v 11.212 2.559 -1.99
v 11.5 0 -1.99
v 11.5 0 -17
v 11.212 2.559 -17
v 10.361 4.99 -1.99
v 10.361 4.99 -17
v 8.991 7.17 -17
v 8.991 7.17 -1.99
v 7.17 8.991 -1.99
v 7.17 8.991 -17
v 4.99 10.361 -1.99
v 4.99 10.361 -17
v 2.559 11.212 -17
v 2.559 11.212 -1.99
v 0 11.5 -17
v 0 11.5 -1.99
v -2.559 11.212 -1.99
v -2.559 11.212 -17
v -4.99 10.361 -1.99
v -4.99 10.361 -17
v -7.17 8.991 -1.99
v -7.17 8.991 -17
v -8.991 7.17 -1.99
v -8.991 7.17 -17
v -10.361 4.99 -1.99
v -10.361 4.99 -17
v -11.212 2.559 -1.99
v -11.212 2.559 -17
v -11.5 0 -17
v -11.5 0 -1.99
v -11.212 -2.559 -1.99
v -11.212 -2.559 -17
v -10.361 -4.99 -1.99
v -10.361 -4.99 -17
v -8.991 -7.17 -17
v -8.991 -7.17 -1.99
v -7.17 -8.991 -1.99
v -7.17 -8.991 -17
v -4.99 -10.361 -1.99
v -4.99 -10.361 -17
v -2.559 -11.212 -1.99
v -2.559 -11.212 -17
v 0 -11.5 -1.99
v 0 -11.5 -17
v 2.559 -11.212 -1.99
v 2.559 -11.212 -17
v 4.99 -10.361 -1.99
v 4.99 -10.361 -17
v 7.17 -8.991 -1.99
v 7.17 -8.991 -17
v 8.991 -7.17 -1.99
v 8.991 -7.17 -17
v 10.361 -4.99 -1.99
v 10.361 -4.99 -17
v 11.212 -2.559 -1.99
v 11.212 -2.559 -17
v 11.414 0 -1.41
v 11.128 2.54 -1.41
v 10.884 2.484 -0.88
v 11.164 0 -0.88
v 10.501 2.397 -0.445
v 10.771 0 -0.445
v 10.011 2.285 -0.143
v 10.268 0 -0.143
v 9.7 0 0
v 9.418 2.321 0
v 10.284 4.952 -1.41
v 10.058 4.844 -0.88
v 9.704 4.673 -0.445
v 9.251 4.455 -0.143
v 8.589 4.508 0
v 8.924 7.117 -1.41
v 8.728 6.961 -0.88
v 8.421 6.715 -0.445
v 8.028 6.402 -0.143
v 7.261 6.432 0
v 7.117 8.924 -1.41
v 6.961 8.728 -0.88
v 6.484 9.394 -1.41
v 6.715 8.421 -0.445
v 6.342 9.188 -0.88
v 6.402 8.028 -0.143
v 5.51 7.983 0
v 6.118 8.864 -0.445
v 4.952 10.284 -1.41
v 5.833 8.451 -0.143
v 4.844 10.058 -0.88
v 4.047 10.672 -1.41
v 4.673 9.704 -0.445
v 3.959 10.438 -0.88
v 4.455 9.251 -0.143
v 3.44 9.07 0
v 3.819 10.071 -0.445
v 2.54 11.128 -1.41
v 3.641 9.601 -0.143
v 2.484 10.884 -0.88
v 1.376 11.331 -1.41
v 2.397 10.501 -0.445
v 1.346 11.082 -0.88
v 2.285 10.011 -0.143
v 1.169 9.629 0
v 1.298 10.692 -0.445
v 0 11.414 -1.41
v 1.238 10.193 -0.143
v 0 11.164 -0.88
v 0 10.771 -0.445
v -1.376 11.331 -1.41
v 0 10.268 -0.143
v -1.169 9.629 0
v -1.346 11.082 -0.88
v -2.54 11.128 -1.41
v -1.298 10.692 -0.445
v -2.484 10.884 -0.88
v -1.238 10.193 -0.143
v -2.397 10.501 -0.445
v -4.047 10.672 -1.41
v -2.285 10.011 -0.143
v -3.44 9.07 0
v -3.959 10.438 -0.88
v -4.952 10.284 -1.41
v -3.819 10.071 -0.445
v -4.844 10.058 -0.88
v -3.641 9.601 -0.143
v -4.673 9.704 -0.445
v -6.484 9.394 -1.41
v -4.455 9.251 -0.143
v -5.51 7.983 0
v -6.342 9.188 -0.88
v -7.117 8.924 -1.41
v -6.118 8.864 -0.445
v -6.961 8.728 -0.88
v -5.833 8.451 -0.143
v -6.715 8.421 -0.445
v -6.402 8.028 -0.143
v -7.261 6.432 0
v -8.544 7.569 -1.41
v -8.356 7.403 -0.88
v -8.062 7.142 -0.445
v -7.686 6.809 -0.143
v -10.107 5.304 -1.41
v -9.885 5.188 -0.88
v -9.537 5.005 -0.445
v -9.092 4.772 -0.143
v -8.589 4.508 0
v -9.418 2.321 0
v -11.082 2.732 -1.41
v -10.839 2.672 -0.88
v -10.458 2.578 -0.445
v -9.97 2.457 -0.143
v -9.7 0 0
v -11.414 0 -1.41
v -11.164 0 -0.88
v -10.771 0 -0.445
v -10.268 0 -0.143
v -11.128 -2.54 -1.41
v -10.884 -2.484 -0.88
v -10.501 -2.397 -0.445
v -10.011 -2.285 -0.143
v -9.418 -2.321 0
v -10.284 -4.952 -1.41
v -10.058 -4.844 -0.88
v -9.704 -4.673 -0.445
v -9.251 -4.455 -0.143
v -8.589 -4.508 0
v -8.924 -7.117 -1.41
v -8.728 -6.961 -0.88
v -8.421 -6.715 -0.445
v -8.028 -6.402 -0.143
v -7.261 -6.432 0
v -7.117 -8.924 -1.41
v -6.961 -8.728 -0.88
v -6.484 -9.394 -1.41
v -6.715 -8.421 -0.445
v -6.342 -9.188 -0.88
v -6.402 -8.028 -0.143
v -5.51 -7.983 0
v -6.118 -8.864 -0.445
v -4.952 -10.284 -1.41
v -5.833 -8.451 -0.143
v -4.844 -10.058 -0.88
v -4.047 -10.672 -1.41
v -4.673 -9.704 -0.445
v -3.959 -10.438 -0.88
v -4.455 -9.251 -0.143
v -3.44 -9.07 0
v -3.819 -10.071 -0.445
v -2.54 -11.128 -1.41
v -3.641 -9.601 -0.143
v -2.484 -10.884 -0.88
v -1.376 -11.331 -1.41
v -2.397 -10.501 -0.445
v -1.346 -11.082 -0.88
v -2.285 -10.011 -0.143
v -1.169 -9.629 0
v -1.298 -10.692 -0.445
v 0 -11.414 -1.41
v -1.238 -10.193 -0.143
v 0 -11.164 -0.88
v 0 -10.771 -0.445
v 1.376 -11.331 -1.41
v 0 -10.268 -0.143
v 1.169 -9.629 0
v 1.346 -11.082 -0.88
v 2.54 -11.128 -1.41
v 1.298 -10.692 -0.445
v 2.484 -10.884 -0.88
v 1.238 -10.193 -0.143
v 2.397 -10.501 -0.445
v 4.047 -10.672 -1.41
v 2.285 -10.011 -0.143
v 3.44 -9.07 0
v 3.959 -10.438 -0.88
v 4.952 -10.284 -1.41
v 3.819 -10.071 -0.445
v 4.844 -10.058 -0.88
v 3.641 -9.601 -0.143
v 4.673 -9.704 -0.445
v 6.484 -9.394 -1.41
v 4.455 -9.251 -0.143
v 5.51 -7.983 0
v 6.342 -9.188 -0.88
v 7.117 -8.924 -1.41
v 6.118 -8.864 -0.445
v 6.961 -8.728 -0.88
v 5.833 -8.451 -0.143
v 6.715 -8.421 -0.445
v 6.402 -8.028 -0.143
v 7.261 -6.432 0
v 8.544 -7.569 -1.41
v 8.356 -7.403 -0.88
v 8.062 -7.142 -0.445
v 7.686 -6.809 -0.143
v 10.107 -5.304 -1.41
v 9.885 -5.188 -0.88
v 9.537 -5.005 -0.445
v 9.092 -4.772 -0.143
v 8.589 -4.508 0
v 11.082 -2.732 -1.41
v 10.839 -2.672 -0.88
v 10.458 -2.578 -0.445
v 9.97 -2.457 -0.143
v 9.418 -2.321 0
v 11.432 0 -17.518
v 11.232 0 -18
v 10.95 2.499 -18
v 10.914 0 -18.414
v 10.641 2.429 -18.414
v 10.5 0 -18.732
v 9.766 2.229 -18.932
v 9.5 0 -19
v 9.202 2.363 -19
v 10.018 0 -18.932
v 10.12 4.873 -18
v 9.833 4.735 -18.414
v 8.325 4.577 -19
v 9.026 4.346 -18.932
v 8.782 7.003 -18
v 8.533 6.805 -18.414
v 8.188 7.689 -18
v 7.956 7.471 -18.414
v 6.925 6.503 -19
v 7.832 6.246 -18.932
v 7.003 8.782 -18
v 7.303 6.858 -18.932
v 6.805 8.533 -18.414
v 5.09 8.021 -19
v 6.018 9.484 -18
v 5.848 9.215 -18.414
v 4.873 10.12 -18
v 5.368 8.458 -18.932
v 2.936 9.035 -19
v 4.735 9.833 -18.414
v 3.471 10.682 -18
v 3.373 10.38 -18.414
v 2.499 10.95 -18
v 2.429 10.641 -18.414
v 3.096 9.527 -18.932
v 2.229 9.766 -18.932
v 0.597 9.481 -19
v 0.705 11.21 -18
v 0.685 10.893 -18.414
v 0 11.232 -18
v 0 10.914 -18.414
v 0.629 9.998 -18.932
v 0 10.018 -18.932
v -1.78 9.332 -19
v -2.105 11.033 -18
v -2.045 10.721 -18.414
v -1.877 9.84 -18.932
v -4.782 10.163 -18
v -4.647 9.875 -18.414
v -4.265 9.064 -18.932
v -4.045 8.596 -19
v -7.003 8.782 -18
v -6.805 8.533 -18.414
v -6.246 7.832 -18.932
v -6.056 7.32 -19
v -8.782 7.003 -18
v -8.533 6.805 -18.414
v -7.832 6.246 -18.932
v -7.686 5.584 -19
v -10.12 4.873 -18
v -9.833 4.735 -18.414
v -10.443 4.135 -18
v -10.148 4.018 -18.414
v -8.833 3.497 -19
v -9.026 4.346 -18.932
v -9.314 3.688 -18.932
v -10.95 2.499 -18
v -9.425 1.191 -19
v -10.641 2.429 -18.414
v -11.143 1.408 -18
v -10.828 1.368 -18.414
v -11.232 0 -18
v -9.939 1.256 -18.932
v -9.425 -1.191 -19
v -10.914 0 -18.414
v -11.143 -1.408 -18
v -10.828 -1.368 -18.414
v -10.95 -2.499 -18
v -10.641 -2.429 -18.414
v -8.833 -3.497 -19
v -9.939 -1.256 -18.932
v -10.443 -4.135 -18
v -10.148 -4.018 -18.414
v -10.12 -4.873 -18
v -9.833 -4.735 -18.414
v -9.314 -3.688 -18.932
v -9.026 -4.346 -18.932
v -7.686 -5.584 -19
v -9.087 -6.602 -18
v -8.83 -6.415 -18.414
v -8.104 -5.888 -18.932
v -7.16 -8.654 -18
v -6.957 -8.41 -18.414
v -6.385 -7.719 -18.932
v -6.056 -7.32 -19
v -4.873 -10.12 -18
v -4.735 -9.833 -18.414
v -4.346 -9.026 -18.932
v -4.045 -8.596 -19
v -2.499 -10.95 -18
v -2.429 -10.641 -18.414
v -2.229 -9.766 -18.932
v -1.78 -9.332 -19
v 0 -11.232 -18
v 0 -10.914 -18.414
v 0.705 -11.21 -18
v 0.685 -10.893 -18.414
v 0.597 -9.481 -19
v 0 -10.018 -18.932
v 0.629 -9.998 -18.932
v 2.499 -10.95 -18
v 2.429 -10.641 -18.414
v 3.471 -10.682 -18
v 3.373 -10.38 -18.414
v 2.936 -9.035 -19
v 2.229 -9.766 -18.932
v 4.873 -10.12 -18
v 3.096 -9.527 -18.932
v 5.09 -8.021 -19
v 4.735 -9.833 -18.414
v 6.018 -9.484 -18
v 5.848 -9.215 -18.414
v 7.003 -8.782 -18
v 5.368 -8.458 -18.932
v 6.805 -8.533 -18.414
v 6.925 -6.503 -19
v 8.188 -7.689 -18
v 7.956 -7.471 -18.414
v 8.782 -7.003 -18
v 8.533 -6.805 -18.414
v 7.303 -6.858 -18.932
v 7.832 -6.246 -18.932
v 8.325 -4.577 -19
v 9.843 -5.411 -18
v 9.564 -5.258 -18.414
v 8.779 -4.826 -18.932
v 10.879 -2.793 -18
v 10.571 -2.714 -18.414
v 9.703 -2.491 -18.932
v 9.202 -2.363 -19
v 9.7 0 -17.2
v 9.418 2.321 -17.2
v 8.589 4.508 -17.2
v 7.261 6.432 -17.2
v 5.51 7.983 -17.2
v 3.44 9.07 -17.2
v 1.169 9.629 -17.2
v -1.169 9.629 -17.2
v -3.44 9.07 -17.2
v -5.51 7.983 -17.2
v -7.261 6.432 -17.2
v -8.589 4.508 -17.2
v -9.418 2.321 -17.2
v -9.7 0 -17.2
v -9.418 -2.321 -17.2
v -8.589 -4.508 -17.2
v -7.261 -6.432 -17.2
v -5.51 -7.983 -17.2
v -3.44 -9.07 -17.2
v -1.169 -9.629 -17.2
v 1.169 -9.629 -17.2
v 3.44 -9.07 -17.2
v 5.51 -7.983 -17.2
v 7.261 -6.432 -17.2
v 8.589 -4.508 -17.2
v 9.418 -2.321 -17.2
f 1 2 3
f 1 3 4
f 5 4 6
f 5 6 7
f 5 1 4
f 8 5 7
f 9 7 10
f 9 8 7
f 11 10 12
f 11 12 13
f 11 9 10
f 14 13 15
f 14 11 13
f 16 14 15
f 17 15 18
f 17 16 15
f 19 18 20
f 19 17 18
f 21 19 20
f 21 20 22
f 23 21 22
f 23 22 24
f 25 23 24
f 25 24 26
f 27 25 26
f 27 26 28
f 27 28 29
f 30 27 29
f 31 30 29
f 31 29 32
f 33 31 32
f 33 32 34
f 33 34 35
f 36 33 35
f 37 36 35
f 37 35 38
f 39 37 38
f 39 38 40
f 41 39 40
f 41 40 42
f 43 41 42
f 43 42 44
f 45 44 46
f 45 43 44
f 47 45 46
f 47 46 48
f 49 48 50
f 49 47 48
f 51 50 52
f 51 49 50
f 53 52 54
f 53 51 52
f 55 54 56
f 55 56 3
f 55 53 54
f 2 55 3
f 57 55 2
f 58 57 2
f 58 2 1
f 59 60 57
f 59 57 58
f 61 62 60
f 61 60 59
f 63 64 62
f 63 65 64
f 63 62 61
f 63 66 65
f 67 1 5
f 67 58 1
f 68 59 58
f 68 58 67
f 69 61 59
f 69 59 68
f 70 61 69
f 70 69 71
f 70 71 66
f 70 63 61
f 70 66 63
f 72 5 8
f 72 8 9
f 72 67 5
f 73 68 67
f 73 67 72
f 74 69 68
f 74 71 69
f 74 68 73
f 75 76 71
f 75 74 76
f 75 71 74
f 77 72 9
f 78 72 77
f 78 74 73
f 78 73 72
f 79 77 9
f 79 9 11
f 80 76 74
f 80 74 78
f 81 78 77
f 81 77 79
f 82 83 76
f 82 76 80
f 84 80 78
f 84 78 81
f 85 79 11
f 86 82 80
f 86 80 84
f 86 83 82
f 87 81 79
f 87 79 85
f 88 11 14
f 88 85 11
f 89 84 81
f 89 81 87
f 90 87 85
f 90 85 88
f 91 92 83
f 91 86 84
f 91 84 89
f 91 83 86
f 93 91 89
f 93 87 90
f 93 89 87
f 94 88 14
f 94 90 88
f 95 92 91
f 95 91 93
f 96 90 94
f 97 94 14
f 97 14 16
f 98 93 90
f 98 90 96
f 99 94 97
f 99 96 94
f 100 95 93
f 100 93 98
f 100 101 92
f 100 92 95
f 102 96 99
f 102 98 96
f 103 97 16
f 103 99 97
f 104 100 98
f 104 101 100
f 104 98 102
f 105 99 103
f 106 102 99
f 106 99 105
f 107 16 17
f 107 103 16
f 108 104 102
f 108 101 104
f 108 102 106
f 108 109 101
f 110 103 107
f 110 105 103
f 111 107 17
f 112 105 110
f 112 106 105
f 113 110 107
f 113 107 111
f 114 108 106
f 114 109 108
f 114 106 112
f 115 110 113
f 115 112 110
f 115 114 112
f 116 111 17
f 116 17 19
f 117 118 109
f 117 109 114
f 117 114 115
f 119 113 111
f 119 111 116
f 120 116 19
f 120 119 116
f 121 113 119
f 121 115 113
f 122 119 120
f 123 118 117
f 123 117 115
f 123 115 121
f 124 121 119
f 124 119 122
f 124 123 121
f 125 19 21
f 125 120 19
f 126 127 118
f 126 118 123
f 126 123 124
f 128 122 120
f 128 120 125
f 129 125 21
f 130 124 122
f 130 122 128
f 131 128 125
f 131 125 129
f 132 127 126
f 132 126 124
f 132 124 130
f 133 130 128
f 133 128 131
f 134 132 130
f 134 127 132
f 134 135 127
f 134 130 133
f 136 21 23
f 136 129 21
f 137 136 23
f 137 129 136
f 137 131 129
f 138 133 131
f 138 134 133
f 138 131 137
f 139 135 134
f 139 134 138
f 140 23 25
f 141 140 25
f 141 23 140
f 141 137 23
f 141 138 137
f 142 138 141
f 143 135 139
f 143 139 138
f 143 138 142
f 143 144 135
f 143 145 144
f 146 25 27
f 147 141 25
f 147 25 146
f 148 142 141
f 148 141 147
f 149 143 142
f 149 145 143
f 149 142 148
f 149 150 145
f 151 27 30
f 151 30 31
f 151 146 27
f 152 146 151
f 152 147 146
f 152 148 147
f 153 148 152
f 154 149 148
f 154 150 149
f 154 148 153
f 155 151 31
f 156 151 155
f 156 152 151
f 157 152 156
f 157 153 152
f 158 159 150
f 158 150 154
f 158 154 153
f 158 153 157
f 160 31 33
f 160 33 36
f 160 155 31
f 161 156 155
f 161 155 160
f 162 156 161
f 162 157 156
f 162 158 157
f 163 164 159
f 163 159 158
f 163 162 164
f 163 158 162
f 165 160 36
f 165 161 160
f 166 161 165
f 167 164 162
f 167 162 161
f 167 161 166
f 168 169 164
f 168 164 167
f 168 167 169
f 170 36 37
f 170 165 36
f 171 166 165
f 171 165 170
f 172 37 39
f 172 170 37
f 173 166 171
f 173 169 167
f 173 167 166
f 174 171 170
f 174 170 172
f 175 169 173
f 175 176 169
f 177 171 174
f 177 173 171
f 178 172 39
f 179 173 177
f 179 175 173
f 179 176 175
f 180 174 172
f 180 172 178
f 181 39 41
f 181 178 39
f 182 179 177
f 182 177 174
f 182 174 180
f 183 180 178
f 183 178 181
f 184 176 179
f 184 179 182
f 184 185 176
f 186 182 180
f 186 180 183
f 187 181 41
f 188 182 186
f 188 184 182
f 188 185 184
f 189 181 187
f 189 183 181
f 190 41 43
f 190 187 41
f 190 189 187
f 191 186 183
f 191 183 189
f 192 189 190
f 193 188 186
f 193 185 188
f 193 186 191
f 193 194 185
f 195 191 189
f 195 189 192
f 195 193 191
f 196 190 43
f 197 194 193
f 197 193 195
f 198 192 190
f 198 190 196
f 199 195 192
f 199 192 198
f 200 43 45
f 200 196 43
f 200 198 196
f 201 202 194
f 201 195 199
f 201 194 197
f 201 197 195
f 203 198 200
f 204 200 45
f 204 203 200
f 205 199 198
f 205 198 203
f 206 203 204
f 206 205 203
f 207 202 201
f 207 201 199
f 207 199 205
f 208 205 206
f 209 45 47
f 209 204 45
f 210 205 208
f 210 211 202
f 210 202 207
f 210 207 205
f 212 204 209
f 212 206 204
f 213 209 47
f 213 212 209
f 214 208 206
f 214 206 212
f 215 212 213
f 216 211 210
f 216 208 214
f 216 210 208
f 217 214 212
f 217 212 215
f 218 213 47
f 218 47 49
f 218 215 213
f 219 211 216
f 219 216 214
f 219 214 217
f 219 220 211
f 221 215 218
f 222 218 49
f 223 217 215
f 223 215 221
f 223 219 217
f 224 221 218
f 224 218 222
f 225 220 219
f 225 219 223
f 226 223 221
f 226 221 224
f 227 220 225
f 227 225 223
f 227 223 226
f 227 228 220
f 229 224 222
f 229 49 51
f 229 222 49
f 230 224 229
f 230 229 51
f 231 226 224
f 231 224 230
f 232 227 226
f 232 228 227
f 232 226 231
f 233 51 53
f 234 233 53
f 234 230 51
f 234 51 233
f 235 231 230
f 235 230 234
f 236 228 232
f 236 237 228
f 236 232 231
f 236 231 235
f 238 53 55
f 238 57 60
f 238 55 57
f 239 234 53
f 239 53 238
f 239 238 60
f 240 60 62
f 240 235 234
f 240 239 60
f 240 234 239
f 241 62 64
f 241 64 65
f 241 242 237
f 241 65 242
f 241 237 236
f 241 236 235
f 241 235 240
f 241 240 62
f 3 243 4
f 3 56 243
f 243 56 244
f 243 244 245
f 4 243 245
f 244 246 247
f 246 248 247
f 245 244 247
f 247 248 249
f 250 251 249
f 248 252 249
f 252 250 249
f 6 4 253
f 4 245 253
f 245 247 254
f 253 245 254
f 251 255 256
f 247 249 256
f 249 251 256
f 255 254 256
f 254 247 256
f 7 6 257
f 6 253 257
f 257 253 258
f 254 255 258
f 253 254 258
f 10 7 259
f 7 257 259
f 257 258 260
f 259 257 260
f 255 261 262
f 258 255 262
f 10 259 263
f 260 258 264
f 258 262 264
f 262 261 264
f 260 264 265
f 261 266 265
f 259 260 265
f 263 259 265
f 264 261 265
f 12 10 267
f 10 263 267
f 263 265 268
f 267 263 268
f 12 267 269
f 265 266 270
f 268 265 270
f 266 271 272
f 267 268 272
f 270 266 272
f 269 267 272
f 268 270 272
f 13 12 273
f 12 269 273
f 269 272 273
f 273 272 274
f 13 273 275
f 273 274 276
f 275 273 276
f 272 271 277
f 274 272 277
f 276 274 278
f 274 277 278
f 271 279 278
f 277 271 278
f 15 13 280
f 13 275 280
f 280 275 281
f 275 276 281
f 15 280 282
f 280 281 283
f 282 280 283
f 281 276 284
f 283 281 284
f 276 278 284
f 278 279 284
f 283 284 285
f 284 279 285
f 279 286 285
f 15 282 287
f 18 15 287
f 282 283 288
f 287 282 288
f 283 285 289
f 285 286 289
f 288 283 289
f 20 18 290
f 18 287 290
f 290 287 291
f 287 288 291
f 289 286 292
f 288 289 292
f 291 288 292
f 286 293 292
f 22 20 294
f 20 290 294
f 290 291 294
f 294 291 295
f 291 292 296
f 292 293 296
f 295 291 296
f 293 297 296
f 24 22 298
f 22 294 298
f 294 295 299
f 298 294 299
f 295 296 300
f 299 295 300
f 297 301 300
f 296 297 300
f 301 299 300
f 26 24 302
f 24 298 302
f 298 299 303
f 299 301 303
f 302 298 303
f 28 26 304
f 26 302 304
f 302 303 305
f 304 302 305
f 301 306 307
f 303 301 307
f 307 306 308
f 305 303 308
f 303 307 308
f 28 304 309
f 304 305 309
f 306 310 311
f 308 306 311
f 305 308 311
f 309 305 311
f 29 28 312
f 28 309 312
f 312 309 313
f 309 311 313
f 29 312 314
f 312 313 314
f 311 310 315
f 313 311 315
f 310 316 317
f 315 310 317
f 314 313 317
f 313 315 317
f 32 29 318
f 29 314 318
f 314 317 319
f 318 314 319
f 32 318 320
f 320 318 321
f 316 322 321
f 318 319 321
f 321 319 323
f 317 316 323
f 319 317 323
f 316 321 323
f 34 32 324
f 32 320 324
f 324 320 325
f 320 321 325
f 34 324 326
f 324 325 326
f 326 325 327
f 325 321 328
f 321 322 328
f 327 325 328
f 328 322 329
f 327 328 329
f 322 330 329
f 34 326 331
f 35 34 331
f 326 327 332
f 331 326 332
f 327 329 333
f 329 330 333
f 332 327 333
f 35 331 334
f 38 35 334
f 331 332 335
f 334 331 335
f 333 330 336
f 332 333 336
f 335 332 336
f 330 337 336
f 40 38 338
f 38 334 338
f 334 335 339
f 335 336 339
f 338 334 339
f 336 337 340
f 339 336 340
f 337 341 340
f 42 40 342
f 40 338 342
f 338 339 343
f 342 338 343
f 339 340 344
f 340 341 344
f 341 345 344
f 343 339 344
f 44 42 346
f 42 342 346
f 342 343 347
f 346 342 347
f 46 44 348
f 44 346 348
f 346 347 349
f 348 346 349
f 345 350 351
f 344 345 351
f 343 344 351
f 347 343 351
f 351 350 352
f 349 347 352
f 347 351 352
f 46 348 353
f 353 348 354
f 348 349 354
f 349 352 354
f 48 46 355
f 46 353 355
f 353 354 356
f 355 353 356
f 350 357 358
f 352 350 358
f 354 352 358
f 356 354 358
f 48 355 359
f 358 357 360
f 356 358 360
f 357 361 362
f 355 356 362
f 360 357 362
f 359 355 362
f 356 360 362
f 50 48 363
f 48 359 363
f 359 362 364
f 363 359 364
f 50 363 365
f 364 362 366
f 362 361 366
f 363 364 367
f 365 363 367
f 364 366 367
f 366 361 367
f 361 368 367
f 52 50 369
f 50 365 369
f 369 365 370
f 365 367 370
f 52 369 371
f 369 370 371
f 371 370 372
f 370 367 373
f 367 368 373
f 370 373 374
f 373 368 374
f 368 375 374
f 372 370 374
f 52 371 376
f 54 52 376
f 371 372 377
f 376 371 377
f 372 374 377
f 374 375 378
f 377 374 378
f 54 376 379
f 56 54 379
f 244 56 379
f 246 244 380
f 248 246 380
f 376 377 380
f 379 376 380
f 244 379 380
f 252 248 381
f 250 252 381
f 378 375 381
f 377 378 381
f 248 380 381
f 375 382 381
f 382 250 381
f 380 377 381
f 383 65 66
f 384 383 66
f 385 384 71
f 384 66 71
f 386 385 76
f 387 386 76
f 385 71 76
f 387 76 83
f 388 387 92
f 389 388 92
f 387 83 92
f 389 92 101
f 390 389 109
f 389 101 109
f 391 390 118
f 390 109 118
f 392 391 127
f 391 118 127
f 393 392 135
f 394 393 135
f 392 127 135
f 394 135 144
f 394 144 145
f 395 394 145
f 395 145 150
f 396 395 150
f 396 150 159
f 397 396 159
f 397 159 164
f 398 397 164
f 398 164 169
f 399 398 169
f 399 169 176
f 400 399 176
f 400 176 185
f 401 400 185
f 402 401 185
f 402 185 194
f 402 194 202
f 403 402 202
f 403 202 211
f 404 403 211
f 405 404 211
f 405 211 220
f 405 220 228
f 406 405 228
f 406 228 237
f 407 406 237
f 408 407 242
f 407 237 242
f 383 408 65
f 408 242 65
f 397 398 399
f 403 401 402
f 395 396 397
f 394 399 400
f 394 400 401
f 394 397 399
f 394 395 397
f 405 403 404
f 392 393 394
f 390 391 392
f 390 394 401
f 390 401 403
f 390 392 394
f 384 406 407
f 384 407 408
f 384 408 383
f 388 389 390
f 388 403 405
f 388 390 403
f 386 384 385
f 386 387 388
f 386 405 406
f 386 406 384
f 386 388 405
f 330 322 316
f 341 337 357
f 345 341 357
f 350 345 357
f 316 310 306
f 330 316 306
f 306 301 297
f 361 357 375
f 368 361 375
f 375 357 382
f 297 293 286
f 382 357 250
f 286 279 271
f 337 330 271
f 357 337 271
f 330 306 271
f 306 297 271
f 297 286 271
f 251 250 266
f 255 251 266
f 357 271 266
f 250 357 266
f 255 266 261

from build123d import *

# Parameters (mm, degrees)
F0_R     = 11.5
F1_DEPTH = 19
F2_T     = -1.8


# Not quite as in the source:
# - a fillet or chamfer that OpenCascade refuses, or shapes differently, is made with other operations: its cross-section is extruded or revolved along the edge and cut away or added


with BuildPart() as f1:
    # F0 (on Top) → F1 (new body)
    with BuildSketch(Plane.XY):
        Circle(F0_R)
    extrude(amount=-F1_DEPTH)

    # F2
    f2_openings = [f1.faces().sort_by_distance(p)[0] for p in [
        (0, 0, 0),
    ]]
    offset(amount=F2_T, openings=f2_openings)

    # F3: fillet of radius 2 on 2 edges, made by hand

    # F3_s1 → F3_t2 (revolve, cut)
    with BuildSketch(Plane.XZ):
        with BuildLine():
            ThreePointArc((11.5, -17), (10.9142135624, -18.4142135624), (9.5, -19))
            Line((9.5, -19), (11.5, -19))
            Line((11.5, -19), (11.5, -17))
        make_face()
    revolve(axis=Axis((0, 0, -19), (0, 0, 1)), mode=Mode.SUBTRACT)

    # F3_s3 → F3_t4 (revolve, cut)
    with BuildSketch(Plane.XZ):
        with BuildLine():
            ThreePointArc((11.5, -1.9899748742), (10.9832396974, -0.6483340877), (9.7, 0))
            Line((9.7, 0), (11.5, 0))
            Line((11.5, 0), (11.5, -1.9899748742))
        make_face()
    revolve(axis=Axis((0, 0, 0), (0, 0, 1)), mode=Mode.SUBTRACT)


solid = f1.part
